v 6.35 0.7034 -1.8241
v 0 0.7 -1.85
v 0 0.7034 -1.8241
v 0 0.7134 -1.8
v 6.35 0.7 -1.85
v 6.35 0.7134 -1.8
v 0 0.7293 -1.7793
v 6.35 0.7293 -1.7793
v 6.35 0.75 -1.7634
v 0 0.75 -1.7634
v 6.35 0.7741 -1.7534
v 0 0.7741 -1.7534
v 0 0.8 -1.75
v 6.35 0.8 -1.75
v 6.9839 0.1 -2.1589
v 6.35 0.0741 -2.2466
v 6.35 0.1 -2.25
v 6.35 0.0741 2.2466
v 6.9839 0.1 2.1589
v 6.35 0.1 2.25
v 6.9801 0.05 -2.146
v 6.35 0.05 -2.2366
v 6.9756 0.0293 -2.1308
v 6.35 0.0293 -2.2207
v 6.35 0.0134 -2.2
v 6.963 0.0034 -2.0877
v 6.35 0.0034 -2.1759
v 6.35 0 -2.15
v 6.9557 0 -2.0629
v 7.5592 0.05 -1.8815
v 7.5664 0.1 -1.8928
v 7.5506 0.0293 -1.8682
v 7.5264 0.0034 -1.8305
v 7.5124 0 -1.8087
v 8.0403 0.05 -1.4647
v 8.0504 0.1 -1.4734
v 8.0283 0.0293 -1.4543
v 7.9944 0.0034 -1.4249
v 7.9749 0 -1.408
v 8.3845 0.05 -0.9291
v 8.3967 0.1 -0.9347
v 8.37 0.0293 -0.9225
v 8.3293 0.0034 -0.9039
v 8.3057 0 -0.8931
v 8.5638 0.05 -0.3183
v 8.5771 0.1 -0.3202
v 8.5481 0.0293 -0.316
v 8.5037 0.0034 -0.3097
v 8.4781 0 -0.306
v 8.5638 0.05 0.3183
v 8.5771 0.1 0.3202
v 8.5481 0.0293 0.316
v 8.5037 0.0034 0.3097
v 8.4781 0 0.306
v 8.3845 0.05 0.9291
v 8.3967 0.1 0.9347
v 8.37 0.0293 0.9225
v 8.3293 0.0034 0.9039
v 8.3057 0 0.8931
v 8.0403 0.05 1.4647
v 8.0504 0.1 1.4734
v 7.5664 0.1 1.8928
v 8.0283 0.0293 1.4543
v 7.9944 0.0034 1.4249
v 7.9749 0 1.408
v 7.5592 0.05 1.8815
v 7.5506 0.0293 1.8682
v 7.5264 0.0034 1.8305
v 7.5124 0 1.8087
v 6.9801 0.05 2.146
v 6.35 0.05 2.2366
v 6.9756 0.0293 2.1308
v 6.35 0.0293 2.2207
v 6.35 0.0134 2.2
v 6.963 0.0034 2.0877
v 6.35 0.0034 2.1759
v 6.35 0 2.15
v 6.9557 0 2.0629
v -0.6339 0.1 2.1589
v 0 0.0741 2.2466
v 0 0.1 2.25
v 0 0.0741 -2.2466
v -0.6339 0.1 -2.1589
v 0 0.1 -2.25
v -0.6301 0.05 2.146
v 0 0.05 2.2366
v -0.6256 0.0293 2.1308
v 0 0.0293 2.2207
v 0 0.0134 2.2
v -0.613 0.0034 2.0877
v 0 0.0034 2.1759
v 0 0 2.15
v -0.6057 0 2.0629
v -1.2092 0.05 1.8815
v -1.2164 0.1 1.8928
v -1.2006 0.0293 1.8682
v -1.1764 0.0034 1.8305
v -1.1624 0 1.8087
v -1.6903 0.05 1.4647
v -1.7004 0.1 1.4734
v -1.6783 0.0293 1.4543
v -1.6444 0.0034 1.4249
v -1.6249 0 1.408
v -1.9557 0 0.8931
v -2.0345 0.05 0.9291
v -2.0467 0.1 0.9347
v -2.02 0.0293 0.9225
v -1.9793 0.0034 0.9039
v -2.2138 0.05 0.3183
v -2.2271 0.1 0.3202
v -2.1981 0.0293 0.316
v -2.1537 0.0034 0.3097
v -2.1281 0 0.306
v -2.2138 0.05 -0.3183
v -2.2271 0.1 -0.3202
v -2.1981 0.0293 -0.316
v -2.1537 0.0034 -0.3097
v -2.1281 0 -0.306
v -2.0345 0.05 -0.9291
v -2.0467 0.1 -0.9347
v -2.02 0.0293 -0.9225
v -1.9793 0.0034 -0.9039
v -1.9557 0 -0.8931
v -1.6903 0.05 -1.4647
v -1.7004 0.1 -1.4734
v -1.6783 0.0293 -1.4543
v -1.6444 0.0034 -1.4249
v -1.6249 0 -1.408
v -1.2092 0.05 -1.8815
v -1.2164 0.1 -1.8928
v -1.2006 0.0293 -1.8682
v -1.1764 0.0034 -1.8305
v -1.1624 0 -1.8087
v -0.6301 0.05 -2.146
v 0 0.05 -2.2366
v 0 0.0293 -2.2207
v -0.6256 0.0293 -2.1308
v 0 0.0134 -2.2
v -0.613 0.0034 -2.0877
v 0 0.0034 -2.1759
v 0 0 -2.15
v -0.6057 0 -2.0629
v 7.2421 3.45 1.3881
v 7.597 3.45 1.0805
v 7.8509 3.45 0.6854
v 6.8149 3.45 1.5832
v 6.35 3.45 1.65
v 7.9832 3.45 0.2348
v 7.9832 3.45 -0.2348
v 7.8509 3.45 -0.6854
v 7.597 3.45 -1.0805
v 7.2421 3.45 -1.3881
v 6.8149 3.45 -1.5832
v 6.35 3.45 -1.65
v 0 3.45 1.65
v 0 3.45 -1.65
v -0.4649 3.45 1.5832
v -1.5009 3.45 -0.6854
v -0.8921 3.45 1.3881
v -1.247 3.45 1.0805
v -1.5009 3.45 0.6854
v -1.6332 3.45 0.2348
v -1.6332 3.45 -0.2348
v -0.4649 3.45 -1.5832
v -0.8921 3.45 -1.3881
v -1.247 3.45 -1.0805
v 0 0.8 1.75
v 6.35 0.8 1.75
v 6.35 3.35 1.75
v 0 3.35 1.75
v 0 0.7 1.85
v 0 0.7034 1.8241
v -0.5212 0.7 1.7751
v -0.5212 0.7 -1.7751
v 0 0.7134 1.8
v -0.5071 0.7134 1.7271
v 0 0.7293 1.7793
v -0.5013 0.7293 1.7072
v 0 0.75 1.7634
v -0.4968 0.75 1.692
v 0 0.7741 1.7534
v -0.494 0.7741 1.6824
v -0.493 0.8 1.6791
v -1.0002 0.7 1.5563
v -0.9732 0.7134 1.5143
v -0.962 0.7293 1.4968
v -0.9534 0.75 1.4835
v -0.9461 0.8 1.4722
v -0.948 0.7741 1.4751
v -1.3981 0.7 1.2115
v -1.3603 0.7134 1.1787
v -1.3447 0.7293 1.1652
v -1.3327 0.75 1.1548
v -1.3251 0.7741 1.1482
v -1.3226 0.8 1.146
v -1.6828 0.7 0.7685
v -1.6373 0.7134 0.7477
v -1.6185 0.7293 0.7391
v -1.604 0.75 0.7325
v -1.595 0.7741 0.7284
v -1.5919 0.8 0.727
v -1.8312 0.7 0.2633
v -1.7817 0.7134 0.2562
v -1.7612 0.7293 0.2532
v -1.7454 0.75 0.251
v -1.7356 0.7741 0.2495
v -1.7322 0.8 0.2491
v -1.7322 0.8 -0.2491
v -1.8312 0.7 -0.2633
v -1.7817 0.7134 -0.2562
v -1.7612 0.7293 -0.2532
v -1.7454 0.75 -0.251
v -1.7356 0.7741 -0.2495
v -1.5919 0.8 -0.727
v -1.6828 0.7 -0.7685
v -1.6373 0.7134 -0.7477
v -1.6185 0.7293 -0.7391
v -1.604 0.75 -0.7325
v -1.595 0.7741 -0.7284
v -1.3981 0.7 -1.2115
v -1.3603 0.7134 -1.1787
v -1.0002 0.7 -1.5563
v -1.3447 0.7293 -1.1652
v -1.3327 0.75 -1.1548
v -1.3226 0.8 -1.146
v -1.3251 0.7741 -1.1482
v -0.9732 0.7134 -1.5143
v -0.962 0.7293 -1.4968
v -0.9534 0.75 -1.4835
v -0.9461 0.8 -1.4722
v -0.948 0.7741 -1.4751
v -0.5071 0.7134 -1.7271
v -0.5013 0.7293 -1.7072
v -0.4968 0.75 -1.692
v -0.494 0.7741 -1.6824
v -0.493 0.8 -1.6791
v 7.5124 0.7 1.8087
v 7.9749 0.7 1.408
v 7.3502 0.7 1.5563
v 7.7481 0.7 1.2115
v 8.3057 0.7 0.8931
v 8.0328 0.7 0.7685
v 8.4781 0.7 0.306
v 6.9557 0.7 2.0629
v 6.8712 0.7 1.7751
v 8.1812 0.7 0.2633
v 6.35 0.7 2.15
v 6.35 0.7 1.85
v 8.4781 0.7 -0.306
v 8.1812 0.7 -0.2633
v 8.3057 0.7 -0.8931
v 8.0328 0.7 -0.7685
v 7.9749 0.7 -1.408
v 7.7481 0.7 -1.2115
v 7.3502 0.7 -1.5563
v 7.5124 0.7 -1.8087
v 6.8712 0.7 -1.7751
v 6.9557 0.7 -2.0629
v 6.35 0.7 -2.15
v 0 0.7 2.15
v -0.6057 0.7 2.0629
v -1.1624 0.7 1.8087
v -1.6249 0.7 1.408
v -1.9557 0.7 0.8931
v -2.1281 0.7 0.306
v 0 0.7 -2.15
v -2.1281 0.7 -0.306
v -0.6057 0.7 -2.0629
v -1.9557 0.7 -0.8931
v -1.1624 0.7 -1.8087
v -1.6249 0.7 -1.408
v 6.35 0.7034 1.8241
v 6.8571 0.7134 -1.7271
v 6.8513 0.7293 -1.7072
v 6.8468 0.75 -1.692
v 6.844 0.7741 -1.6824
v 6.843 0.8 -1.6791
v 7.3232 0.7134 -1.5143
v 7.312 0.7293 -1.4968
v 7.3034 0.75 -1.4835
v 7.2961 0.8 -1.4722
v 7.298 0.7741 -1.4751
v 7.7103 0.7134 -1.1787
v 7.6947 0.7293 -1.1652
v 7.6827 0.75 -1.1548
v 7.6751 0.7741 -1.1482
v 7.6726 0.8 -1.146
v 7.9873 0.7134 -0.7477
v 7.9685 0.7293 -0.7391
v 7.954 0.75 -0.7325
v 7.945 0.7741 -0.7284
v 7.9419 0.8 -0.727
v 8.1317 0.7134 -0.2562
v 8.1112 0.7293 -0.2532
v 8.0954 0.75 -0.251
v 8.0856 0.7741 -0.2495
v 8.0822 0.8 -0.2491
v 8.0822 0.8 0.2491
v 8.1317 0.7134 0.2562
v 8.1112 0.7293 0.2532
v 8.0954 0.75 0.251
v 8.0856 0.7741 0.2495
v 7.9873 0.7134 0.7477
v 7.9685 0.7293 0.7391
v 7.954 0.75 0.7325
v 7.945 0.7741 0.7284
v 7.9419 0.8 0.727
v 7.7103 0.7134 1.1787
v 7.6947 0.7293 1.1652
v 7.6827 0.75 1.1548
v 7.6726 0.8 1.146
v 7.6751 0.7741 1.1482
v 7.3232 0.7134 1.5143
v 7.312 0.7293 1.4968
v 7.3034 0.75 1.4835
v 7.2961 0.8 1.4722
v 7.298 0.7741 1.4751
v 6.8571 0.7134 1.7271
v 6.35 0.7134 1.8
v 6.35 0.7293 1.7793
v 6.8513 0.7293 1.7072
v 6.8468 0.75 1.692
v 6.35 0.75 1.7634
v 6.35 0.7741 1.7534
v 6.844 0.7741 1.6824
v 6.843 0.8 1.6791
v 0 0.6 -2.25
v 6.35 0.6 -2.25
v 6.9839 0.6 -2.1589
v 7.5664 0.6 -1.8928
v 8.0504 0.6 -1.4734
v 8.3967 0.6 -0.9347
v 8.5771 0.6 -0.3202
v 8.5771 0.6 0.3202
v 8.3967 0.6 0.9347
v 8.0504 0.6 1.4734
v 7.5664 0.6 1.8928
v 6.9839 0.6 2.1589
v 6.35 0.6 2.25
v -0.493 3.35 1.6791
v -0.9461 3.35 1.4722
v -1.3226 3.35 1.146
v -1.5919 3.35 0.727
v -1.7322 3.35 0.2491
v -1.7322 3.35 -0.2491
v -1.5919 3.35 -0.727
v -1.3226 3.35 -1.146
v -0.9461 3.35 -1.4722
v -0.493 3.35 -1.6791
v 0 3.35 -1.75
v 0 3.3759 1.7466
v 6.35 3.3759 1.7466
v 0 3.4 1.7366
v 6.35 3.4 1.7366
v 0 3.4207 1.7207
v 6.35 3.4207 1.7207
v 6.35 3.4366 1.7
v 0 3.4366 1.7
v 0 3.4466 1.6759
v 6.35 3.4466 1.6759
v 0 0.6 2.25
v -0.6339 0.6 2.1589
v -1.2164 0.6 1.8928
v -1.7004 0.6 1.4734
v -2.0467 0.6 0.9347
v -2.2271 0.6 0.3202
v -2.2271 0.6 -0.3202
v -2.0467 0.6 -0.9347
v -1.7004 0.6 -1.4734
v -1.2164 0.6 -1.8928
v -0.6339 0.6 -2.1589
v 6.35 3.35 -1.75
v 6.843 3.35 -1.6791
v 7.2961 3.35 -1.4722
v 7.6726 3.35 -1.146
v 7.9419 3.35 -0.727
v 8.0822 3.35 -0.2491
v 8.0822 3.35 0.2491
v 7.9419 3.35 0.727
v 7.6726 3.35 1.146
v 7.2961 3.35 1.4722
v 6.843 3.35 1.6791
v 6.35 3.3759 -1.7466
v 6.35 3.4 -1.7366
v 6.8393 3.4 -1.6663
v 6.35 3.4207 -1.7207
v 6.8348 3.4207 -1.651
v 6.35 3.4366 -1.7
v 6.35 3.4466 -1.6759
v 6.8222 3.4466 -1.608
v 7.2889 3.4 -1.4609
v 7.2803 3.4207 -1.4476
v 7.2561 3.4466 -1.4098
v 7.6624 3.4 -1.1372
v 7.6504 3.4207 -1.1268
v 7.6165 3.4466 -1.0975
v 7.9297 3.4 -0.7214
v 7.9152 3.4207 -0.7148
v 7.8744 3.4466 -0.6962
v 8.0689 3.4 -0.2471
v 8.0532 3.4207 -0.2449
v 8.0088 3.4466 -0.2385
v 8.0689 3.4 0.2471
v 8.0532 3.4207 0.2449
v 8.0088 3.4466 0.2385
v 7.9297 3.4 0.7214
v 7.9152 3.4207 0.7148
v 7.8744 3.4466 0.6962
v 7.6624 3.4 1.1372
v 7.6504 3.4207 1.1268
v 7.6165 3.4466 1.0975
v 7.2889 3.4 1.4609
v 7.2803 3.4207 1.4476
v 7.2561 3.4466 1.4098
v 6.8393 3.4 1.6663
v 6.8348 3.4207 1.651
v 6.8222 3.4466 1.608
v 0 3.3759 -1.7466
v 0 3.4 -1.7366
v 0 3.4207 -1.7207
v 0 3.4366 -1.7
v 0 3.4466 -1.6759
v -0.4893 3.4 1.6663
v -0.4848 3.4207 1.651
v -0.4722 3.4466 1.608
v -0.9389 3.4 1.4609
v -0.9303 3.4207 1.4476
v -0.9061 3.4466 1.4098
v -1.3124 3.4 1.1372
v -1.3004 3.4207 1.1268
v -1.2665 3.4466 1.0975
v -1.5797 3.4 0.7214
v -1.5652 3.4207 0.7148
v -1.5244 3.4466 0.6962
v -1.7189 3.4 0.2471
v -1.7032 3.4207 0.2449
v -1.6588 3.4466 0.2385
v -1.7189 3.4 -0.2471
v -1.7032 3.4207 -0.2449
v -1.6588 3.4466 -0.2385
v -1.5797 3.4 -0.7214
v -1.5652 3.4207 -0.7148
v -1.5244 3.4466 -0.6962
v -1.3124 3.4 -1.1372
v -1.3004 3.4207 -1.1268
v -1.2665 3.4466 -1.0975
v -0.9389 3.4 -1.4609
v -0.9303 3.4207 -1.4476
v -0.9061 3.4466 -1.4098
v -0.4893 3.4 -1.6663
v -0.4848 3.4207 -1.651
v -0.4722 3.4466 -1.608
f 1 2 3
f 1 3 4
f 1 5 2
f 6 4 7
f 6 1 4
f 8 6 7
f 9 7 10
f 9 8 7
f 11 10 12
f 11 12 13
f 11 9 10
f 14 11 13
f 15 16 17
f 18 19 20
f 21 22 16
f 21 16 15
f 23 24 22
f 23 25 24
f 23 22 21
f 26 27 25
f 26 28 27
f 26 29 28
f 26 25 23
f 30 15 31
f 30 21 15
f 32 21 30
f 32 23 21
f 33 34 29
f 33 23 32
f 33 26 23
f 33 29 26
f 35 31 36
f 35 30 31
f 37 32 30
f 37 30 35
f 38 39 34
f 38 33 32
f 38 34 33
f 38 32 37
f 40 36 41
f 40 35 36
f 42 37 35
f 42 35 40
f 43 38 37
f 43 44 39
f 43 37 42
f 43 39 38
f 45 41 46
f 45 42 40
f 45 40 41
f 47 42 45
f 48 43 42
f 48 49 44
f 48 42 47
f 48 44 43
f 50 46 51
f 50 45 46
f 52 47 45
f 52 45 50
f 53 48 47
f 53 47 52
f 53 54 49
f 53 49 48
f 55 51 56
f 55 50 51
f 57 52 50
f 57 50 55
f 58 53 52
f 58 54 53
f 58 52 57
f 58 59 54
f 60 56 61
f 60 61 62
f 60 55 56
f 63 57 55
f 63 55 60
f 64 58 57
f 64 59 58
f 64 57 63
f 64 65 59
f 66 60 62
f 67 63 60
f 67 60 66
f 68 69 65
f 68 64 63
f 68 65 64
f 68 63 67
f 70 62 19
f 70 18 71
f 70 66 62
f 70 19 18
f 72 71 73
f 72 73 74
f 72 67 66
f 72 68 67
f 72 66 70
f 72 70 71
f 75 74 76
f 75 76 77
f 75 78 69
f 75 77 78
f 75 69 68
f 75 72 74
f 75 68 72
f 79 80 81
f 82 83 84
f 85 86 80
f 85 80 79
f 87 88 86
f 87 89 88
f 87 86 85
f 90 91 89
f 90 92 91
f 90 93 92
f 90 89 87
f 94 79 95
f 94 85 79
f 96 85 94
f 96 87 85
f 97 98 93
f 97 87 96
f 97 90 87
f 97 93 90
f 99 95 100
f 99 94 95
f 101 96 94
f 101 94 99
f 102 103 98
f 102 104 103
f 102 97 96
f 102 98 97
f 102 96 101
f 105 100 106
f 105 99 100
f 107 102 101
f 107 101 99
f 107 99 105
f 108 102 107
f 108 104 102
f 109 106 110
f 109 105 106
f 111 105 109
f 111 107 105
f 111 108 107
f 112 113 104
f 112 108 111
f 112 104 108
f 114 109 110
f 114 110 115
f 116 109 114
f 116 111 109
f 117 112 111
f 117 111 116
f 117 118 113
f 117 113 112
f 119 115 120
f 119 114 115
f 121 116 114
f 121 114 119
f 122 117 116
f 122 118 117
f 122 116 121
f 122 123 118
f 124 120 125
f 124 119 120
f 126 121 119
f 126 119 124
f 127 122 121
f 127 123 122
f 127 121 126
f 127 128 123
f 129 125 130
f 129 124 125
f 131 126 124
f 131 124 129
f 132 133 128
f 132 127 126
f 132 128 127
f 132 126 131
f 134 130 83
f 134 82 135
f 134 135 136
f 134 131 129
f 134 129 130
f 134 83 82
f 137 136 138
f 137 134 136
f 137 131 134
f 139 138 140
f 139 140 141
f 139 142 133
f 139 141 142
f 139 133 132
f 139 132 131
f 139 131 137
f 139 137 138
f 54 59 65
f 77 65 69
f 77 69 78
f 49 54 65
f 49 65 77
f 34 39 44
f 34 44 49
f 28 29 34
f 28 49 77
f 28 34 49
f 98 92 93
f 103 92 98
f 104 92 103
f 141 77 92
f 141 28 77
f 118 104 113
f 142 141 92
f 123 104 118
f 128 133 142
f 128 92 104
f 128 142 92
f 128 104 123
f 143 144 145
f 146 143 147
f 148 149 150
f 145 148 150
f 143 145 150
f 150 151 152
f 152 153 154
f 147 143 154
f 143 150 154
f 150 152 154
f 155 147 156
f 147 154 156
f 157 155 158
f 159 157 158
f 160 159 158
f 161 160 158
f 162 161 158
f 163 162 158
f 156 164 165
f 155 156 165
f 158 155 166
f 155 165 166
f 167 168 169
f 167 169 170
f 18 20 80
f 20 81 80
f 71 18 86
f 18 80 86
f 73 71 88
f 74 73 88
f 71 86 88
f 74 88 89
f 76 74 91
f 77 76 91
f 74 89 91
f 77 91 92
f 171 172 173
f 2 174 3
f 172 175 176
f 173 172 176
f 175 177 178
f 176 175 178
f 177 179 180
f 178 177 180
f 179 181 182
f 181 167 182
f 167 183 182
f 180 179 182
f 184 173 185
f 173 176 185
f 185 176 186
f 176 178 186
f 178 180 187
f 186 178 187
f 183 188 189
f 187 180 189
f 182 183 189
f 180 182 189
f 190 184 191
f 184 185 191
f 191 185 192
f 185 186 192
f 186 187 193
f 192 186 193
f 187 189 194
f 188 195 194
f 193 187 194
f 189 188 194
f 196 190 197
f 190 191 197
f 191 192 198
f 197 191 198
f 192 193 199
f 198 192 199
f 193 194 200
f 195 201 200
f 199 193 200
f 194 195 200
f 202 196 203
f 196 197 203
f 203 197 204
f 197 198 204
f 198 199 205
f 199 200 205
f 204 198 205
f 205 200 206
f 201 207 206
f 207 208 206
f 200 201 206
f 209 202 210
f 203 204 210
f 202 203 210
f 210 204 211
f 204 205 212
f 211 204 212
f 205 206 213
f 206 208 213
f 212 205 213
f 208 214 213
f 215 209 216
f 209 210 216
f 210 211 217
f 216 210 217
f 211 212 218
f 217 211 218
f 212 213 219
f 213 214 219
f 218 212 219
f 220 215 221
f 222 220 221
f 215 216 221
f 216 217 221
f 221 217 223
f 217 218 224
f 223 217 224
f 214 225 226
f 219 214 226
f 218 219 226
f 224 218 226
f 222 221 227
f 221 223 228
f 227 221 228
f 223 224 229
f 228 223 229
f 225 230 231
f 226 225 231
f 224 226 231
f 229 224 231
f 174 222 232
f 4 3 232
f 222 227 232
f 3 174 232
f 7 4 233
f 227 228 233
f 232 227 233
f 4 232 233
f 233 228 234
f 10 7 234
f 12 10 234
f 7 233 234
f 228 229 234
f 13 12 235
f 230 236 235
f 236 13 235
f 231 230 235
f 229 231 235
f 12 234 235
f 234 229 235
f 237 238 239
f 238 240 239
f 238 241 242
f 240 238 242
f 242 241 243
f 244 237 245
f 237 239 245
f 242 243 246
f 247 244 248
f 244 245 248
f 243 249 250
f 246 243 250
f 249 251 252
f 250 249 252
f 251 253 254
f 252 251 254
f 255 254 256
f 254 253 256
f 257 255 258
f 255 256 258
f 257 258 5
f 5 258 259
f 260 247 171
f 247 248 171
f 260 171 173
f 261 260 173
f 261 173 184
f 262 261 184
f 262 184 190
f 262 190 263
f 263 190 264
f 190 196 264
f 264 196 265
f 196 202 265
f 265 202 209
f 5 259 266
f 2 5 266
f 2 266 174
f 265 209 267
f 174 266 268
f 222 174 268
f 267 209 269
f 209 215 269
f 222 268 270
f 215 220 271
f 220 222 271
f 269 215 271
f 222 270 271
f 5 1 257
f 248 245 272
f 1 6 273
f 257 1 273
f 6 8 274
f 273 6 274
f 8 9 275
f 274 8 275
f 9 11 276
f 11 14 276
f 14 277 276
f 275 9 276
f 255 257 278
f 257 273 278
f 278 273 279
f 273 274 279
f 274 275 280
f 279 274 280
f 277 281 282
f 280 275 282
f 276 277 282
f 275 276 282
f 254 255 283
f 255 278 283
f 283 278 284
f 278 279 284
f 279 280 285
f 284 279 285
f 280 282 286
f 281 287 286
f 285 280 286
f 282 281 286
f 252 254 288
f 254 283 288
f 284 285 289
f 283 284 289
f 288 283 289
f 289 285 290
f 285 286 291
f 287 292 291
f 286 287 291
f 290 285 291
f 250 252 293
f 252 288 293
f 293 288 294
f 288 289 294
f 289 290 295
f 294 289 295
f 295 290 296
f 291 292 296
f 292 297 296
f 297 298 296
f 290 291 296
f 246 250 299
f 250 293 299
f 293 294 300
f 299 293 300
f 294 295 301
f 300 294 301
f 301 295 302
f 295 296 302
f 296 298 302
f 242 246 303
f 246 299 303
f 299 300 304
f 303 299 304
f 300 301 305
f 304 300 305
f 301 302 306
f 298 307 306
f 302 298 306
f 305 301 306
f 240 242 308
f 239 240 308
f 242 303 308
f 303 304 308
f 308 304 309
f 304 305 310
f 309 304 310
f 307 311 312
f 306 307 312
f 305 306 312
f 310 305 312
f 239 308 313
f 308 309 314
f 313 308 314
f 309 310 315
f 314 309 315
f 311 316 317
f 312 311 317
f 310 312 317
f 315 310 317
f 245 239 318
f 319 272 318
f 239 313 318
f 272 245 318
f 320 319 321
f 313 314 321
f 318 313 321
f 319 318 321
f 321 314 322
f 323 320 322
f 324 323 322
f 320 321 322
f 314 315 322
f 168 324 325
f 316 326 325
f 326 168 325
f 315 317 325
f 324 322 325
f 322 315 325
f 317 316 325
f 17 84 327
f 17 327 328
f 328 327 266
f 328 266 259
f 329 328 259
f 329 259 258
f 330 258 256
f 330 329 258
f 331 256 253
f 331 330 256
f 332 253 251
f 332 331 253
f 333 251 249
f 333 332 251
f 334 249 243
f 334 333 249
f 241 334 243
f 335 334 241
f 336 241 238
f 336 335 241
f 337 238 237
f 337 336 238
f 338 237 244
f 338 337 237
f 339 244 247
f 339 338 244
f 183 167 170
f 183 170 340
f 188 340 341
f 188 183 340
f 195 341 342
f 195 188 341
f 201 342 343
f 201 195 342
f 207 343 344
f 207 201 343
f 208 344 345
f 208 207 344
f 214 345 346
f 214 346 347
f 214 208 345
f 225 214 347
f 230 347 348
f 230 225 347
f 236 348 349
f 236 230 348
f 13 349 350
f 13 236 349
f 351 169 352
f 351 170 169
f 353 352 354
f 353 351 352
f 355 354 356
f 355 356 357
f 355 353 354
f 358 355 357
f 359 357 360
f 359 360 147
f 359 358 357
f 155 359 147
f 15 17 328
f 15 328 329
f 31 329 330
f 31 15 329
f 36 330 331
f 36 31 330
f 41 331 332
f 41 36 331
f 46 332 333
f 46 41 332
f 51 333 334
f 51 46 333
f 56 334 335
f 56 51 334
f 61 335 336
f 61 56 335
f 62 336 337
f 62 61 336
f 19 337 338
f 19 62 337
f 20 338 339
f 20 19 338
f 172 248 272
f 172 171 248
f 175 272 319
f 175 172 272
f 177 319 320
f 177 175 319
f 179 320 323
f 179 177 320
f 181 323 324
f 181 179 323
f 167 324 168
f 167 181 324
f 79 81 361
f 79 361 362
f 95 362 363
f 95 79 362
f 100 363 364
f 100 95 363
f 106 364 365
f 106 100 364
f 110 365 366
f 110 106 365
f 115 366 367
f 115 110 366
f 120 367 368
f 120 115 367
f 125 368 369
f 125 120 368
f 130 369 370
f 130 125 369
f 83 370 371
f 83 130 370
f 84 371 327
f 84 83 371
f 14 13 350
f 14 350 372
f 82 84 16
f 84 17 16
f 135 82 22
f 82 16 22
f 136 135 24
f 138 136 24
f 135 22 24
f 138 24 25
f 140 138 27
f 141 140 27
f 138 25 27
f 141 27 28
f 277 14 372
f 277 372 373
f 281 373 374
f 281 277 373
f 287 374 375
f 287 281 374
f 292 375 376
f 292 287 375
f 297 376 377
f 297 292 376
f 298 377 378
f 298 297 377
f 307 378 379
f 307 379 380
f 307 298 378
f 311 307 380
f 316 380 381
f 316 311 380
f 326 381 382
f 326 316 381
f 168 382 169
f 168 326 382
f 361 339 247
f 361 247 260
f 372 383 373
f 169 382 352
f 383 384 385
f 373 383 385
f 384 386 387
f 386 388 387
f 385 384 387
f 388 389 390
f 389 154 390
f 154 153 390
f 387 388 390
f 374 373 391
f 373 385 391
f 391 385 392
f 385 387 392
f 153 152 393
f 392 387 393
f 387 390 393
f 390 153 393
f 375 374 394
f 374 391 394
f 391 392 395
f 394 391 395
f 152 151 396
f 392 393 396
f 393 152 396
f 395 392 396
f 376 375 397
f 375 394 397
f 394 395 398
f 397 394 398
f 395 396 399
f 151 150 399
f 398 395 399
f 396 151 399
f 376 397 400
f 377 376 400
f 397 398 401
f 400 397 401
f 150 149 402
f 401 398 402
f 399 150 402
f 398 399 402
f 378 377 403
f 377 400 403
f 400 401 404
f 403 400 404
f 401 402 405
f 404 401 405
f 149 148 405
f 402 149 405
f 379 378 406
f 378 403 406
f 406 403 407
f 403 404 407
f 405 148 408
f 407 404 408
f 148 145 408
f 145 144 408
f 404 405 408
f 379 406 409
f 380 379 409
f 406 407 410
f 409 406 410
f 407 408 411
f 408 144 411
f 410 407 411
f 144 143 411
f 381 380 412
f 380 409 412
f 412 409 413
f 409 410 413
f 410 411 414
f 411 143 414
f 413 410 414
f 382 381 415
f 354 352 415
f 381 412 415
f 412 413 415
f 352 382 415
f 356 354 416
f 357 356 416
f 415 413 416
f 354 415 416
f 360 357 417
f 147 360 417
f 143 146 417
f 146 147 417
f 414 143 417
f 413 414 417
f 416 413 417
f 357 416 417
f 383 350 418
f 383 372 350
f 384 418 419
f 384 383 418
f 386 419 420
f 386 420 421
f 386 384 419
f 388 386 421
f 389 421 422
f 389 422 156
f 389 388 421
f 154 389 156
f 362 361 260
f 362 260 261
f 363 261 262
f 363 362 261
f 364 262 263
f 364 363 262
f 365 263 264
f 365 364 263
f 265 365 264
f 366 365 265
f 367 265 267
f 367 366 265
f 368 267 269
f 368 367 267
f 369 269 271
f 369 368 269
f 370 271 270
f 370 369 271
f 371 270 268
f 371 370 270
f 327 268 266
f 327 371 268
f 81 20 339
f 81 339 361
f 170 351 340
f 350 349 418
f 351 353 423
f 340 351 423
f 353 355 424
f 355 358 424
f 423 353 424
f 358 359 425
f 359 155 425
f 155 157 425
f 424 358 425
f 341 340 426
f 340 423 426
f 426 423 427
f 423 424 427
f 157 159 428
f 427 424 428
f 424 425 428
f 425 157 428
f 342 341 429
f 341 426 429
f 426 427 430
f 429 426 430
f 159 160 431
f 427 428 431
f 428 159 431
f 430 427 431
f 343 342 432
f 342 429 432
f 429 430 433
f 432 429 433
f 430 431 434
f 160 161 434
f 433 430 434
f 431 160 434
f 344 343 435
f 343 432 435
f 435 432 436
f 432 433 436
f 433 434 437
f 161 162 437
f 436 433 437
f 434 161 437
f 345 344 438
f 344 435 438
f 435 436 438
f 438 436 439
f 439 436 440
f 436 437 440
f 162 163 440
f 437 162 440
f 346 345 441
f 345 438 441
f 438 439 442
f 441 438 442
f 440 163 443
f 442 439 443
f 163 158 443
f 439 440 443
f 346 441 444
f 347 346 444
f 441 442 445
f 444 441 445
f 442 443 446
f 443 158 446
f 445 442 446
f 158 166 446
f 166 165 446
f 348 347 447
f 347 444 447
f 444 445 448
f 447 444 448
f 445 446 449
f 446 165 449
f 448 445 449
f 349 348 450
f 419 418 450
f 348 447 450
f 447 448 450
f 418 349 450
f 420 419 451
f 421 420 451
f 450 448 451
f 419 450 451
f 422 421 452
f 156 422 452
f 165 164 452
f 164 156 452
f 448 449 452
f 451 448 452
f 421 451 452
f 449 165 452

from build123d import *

# Parameters (mm, degrees)
BOSS_EXTRU_1_DEPTH = 0.7
BOSS_EXTRU_2_DEPTH = 2.75
CONG_1_R           = 0.1
CONG_2_R           = 0.1
CONG_3_R           = 0.1
CHANFREIN1_SIZE    = 0.1


with BuildPart() as part:
    # Esquisse1 → Boss.-Extru.1 (new body)
    with BuildSketch(Plane(origin=(0, 0, 0), x_dir=(1, 0, 0), z_dir=(0, 1, 0))):
        with BuildLine():
            Line((0, 2.25), (6.35, 2.25))
            ThreePointArc((6.35, 2.25), (8.6, 0), (6.35, -2.25))
            Line((6.35, -2.25), (0, -2.25))
            ThreePointArc((0, -2.25), (-2.25, 0), (0, 2.25))
        make_face()
    extrude(amount=BOSS_EXTRU_1_DEPTH)

    # Esquisse2 → Boss.-Extru.2 (add)
    with BuildSketch(Plane(origin=(0, 0.7, 0), x_dir=(1, 0, 0), z_dir=(0, 1, 0))):
        with BuildLine():
            Line((0, 1.75), (6.35, 1.75))
            ThreePointArc((6.35, 1.75), (8.1, 0), (6.35, -1.75))
            Line((6.35, -1.75), (0, -1.75))
            ThreePointArc((0, -1.75), (-1.75, 0), (0, 1.75))
        make_face()
    extrude(amount=BOSS_EXTRU_2_DEPTH)

    # Congé1
    cong_1_edges = [part.edges().sort_by_distance(p)[0] for p in [
        (-1.75, 0.7, 0),
        (3.175, 0.7, 1.75),
        (8.1, 0.7, 0),
        (3.175, 0.7, -1.75),
    ]]
    fillet(cong_1_edges, radius=CONG_1_R)

    # Congé2
    cong_2_edges = [part.edges().sort_by_distance(p)[0] for p in [
        (-1.75, 3.45, 0),
        (3.175, 3.45, 1.75),
        (8.1, 3.45, 0),
        (3.175, 3.45, -1.75),
    ]]
    fillet(cong_2_edges, radius=CONG_2_R)

    # Congé3
    cong_3_edges = [part.edges().sort_by_distance(p)[0] for p in [
        (3.175, 0, -2.25),
        (8.6, 0, 0),
        (3.175, 0, 2.25),
        (-2.25, 0, 0),
    ]]
    fillet(cong_3_edges, radius=CONG_3_R)

    # Chanfrein1
    chanfrein1_edges = [part.edges().sort_by_distance(p)[0] for p in [
        (8.6, 0.7, 0),
        (3.175, 0.7, -2.25),
        (-2.25, 0.7, 0),
        (3.175, 0.7, 2.25),
    ]]
    chamfer(chanfrein1_edges, length=CHANFREIN1_SIZE)


solid = part.part
